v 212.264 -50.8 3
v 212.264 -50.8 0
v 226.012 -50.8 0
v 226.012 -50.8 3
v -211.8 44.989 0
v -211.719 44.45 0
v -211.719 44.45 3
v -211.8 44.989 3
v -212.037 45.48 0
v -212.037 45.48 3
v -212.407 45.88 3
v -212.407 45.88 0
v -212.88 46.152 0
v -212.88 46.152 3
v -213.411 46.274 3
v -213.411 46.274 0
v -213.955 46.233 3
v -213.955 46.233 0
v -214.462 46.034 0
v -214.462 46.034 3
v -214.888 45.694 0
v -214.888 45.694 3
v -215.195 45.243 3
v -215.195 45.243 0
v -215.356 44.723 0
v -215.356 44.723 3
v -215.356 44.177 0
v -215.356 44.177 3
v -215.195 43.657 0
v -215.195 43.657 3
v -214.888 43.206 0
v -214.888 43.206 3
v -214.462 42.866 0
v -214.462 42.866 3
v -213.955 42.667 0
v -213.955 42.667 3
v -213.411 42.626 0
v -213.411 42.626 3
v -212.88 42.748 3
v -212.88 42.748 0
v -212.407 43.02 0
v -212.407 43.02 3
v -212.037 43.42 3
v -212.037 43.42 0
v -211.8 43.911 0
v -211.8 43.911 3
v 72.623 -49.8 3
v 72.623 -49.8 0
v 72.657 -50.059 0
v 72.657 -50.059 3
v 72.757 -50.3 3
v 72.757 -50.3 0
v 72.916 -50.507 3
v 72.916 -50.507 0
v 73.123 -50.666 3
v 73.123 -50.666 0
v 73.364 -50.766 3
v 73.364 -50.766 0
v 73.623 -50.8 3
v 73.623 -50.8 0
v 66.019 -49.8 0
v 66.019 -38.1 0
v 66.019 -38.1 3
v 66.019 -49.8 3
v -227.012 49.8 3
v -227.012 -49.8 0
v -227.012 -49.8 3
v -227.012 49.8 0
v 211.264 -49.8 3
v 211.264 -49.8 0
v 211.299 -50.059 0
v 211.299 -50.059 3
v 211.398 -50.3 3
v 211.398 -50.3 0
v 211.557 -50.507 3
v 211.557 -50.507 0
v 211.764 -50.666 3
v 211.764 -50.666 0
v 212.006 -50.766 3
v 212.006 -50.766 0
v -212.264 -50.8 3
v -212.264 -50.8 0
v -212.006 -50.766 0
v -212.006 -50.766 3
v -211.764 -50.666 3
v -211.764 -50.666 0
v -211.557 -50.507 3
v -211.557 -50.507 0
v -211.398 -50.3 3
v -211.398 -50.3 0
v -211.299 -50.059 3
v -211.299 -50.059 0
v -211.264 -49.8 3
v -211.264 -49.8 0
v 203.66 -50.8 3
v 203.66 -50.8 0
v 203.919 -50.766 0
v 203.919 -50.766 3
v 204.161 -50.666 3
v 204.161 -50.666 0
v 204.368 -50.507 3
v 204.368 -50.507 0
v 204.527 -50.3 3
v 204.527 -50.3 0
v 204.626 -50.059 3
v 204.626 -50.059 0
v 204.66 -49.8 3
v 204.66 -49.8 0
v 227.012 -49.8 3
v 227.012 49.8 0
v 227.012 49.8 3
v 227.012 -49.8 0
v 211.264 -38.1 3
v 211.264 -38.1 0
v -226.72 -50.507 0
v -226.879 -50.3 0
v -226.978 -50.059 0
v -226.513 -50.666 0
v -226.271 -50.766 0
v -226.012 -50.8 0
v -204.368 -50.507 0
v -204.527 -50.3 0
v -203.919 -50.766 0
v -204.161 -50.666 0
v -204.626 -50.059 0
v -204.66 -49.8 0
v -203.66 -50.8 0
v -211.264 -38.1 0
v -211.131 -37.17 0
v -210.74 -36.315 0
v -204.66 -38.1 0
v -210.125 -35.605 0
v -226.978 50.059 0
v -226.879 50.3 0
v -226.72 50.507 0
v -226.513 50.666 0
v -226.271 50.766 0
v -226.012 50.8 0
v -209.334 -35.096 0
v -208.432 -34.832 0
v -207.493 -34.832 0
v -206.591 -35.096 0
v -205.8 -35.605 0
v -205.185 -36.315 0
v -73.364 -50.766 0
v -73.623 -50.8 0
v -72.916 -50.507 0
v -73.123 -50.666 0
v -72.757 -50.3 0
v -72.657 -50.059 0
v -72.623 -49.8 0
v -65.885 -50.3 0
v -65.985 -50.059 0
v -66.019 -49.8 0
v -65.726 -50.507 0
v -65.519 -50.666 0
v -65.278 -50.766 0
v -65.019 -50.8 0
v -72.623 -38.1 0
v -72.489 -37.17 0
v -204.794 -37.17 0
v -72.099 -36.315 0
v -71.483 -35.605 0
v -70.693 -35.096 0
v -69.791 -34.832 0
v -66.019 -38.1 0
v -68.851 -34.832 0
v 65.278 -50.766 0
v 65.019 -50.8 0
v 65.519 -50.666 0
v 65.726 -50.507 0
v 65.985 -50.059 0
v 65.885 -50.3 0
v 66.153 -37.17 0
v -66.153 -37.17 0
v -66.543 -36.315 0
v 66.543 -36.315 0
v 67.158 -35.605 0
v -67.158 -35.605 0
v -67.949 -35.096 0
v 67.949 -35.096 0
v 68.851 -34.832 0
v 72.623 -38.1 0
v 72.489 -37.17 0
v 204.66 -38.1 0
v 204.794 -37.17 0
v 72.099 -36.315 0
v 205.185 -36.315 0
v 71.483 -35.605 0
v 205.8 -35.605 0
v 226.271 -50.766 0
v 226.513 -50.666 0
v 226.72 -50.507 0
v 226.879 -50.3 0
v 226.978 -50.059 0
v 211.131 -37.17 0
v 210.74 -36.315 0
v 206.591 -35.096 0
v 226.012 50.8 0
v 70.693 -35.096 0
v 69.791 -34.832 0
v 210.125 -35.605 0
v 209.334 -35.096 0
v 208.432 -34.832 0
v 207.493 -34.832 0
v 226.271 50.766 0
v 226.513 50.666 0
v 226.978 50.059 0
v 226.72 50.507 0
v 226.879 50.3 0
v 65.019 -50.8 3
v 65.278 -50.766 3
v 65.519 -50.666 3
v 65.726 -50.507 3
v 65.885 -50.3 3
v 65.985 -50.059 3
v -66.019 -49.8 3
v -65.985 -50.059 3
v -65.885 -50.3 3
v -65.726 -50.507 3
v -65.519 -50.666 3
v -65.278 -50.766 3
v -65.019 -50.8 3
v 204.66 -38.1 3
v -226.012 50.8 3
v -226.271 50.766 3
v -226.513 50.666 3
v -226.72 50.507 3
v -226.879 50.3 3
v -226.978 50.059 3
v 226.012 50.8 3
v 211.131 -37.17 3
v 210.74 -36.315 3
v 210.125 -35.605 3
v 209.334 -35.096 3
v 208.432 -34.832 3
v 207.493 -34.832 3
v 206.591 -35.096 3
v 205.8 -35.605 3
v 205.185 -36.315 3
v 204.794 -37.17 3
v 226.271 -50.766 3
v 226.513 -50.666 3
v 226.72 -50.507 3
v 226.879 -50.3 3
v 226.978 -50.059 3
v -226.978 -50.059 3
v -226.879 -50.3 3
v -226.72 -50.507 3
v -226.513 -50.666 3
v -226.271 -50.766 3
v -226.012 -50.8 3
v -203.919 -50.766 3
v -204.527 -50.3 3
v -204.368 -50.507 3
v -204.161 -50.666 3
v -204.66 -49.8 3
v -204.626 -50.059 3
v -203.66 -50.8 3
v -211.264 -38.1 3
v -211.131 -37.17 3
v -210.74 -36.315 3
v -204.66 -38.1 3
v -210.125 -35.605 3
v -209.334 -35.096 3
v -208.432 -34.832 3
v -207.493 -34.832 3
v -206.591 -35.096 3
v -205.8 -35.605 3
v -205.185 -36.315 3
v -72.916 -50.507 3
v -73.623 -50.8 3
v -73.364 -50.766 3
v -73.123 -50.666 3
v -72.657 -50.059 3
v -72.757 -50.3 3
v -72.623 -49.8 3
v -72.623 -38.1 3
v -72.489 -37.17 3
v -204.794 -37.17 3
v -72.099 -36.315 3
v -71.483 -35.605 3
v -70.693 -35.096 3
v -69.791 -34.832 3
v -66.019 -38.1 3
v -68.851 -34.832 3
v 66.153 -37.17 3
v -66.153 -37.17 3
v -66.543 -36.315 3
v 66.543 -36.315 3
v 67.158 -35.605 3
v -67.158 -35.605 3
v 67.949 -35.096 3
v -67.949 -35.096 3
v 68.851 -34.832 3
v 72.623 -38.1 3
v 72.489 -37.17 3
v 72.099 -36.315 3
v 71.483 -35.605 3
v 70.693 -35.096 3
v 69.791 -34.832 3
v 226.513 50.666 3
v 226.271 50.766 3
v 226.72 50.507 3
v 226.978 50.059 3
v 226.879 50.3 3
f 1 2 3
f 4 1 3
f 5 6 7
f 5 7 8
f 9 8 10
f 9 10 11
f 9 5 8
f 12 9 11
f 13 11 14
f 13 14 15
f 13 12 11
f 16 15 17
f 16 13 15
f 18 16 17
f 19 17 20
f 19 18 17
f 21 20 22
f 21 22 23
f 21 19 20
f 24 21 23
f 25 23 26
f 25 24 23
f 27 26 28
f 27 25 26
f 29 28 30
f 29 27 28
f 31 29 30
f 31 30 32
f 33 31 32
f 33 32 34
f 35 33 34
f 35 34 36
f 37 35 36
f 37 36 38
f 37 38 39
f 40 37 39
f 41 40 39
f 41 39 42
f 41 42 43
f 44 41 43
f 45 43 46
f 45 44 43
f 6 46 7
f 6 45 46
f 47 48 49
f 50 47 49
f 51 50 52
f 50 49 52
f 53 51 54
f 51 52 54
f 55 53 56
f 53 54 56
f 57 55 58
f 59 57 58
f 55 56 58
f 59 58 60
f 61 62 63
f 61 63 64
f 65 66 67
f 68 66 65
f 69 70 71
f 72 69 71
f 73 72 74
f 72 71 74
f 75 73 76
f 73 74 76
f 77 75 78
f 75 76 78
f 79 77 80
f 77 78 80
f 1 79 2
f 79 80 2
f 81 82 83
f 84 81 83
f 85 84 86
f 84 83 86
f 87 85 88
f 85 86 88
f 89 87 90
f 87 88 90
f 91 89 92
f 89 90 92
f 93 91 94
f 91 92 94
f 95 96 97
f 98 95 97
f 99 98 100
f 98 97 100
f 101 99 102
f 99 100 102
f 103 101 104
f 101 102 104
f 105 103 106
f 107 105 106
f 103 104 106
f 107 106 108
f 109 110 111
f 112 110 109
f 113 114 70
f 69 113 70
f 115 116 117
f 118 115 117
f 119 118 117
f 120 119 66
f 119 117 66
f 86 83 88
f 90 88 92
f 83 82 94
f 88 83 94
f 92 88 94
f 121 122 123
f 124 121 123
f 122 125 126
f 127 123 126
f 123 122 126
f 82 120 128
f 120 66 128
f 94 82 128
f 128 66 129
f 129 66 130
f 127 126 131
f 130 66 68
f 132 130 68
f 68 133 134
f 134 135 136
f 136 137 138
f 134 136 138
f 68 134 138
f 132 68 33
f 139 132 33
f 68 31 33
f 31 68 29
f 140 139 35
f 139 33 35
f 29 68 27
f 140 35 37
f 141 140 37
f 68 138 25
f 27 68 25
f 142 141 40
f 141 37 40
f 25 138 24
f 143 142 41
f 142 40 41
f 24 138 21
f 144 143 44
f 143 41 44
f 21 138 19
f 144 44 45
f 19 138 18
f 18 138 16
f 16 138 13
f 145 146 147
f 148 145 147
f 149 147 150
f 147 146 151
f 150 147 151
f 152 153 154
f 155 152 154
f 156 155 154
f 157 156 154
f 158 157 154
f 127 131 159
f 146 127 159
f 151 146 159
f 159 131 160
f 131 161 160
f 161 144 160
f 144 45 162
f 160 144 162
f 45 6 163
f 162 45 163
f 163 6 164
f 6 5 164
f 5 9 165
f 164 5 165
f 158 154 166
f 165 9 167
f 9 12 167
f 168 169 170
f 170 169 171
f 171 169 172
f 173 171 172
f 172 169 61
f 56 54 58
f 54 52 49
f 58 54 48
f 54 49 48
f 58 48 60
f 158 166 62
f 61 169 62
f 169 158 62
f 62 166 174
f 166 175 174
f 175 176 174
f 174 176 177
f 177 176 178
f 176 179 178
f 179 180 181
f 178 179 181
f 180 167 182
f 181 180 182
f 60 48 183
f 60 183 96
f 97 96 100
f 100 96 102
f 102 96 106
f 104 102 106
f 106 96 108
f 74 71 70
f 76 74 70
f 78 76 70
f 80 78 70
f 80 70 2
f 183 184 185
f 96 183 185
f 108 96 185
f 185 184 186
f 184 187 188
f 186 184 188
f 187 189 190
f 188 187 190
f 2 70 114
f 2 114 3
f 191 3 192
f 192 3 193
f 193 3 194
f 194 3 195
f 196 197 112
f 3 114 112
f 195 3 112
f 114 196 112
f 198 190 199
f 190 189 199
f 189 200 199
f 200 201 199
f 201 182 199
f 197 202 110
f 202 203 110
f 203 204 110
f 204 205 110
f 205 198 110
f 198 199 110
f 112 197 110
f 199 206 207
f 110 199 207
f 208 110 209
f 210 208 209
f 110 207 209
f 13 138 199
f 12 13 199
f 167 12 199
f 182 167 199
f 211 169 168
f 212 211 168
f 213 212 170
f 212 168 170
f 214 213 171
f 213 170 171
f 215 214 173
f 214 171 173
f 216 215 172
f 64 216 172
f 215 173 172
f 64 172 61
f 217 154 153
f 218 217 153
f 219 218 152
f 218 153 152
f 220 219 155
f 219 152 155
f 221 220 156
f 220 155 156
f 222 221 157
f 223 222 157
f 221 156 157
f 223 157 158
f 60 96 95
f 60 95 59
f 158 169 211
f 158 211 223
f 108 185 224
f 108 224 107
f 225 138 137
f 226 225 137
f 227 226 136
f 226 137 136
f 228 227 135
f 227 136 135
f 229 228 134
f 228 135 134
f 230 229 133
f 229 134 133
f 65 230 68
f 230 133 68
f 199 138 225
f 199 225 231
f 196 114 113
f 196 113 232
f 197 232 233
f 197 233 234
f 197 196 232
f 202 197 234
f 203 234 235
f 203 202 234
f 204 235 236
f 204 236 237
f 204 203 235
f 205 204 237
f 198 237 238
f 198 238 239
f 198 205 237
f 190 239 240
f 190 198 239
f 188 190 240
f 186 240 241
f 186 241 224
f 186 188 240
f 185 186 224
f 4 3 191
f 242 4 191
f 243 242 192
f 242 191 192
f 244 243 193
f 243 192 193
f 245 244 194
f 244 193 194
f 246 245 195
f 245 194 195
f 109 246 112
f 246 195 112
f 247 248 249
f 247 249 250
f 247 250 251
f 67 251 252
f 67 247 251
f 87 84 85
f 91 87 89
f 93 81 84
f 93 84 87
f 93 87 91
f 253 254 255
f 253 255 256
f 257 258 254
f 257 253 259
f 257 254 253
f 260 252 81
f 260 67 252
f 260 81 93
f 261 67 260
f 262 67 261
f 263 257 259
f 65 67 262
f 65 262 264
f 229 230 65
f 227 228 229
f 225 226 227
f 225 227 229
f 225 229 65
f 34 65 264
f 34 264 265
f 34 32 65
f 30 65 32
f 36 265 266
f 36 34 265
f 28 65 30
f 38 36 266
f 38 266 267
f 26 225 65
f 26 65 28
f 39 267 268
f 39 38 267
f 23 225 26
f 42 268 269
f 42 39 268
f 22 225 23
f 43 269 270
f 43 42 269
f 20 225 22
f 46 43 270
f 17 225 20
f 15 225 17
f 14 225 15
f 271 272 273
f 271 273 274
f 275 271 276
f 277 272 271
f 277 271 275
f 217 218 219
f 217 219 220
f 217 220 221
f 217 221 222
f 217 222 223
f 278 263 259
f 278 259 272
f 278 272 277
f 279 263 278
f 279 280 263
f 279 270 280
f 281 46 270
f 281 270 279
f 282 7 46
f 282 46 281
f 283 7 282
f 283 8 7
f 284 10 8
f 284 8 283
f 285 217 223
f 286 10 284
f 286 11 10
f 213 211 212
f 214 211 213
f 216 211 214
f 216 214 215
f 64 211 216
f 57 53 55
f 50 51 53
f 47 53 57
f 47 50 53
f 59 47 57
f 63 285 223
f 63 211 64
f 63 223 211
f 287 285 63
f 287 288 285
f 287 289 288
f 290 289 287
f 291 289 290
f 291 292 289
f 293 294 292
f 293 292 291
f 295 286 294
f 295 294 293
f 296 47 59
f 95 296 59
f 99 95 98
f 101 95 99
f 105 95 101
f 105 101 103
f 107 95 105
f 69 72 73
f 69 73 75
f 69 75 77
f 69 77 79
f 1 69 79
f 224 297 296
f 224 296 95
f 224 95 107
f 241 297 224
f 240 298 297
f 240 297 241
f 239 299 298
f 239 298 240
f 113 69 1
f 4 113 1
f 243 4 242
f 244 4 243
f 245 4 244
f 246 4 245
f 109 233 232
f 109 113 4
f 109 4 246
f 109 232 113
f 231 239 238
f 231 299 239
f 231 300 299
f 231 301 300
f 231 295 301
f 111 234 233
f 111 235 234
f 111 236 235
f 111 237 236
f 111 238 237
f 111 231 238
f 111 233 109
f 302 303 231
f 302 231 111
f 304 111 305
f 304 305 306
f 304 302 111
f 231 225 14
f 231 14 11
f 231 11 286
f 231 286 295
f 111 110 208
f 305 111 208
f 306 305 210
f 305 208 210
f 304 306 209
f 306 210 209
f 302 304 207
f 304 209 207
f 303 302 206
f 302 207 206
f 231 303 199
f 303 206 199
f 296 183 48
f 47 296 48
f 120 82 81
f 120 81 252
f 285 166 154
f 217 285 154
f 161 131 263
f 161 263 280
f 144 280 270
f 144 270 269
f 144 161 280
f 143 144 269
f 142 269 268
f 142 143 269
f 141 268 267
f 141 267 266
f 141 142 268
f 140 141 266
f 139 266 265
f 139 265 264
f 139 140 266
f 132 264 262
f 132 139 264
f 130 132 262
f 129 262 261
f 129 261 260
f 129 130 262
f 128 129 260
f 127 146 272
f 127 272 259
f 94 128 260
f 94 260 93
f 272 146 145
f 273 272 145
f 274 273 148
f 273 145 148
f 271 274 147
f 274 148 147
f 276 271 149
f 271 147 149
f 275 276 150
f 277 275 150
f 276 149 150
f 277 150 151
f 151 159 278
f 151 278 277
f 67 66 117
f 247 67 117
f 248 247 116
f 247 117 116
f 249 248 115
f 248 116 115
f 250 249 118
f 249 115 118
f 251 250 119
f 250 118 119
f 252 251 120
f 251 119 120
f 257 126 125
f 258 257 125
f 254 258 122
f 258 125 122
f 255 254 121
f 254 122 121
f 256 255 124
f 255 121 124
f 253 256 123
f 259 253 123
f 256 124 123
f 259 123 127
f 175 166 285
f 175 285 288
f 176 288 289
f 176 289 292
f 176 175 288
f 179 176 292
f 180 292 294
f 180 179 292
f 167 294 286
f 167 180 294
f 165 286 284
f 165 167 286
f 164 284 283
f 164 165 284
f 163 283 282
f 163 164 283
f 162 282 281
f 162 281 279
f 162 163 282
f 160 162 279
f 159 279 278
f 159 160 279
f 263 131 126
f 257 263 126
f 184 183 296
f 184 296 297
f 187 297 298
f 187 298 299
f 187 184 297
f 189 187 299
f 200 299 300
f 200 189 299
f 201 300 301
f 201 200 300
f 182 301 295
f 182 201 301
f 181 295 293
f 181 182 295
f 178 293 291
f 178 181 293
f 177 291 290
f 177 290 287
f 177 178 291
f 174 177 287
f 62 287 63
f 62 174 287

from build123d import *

# Parameters (mm, degrees)
SKETCH_R  = 1.8288
PAD_DEPTH = 3


with BuildPart() as part:
    # Sketch → Pad (new body)
    with BuildSketch(Plane.XY):
        with BuildLine():
            ThreePointArc((-226.0125, 50.8), (-226.719607, 50.507107), (-227.0125, 49.8))
            Line((-227.0125, -49.8), (-227.0125, 49.8))
            ThreePointArc((-227.0125, -49.8), (-226.719607, -50.507107), (-226.0125, -50.8))
            Line((-212.2645, -50.8), (-226.0125, -50.8))
            ThreePointArc((-212.2645, -50.8), (-211.557393, -50.507107), (-211.2645, -49.8))
            Line((-211.2645, -38.1), (-211.2645, -49.8))
            ThreePointArc((-204.6605, -38.1), (-207.9625, -34.798), (-211.2645, -38.1))
            Line((-204.6605, -38.1), (-204.6605, -49.8))
            ThreePointArc((-204.6605, -49.8), (-204.367607, -50.507107), (-203.6605, -50.8))
            Line((-73.622833, -50.8), (-203.6605, -50.8))
            ThreePointArc((-73.622833, -50.8), (-72.915727, -50.507107), (-72.622833, -49.8))
            Line((-72.622833, -38.1), (-72.622833, -49.8))
            ThreePointArc((-66.018833, -38.1), (-69.320833, -34.798), (-72.622833, -38.1))
            Line((-66.018833, -38.1), (-66.018833, -49.8))
            ThreePointArc((-66.018833, -49.8), (-65.72594, -50.507107), (-65.018833, -50.8))
            Line((65.018833, -50.8), (-65.018833, -50.8))
            ThreePointArc((65.018833, -50.8), (65.72594, -50.507107), (66.018833, -49.8))
            Line((66.018833, -38.1), (66.018833, -49.8))
            ThreePointArc((72.622833, -38.1), (69.320833, -34.798), (66.018833, -38.1))
            Line((72.622833, -38.1), (72.622833, -49.8))
            ThreePointArc((72.622833, -49.8), (72.915727, -50.507107), (73.622833, -50.8))
            Line((203.6605, -50.8), (73.622833, -50.8))
            ThreePointArc((203.6605, -50.8), (204.367607, -50.507107), (204.6605, -49.8))
            Line((204.6605, -38.1), (204.6605, -49.8))
            ThreePointArc((211.2645, -38.1), (207.9625, -34.798), (204.6605, -38.1))
            Line((211.2645, -38.1), (211.2645, -49.8))
            ThreePointArc((211.2645, -49.8), (211.557393, -50.507107), (212.2645, -50.8))
            Line((212.2645, -50.8), (226.0125, -50.8))
            ThreePointArc((226.0125, -50.8), (226.719607, -50.507107), (227.0125, -49.8))
            Line((227.0125, 49.8), (227.0125, -49.8))
            ThreePointArc((227.0125, 49.8), (226.719607, 50.507107), (226.0125, 50.8))
            Line((-226.0125, 50.8), (226.0125, 50.8))
        make_face()
        with Locations((-213.5477, 44.45)):
            Circle(SKETCH_R, mode=Mode.SUBTRACT)
    extrude(amount=PAD_DEPTH)


solid = part.part
